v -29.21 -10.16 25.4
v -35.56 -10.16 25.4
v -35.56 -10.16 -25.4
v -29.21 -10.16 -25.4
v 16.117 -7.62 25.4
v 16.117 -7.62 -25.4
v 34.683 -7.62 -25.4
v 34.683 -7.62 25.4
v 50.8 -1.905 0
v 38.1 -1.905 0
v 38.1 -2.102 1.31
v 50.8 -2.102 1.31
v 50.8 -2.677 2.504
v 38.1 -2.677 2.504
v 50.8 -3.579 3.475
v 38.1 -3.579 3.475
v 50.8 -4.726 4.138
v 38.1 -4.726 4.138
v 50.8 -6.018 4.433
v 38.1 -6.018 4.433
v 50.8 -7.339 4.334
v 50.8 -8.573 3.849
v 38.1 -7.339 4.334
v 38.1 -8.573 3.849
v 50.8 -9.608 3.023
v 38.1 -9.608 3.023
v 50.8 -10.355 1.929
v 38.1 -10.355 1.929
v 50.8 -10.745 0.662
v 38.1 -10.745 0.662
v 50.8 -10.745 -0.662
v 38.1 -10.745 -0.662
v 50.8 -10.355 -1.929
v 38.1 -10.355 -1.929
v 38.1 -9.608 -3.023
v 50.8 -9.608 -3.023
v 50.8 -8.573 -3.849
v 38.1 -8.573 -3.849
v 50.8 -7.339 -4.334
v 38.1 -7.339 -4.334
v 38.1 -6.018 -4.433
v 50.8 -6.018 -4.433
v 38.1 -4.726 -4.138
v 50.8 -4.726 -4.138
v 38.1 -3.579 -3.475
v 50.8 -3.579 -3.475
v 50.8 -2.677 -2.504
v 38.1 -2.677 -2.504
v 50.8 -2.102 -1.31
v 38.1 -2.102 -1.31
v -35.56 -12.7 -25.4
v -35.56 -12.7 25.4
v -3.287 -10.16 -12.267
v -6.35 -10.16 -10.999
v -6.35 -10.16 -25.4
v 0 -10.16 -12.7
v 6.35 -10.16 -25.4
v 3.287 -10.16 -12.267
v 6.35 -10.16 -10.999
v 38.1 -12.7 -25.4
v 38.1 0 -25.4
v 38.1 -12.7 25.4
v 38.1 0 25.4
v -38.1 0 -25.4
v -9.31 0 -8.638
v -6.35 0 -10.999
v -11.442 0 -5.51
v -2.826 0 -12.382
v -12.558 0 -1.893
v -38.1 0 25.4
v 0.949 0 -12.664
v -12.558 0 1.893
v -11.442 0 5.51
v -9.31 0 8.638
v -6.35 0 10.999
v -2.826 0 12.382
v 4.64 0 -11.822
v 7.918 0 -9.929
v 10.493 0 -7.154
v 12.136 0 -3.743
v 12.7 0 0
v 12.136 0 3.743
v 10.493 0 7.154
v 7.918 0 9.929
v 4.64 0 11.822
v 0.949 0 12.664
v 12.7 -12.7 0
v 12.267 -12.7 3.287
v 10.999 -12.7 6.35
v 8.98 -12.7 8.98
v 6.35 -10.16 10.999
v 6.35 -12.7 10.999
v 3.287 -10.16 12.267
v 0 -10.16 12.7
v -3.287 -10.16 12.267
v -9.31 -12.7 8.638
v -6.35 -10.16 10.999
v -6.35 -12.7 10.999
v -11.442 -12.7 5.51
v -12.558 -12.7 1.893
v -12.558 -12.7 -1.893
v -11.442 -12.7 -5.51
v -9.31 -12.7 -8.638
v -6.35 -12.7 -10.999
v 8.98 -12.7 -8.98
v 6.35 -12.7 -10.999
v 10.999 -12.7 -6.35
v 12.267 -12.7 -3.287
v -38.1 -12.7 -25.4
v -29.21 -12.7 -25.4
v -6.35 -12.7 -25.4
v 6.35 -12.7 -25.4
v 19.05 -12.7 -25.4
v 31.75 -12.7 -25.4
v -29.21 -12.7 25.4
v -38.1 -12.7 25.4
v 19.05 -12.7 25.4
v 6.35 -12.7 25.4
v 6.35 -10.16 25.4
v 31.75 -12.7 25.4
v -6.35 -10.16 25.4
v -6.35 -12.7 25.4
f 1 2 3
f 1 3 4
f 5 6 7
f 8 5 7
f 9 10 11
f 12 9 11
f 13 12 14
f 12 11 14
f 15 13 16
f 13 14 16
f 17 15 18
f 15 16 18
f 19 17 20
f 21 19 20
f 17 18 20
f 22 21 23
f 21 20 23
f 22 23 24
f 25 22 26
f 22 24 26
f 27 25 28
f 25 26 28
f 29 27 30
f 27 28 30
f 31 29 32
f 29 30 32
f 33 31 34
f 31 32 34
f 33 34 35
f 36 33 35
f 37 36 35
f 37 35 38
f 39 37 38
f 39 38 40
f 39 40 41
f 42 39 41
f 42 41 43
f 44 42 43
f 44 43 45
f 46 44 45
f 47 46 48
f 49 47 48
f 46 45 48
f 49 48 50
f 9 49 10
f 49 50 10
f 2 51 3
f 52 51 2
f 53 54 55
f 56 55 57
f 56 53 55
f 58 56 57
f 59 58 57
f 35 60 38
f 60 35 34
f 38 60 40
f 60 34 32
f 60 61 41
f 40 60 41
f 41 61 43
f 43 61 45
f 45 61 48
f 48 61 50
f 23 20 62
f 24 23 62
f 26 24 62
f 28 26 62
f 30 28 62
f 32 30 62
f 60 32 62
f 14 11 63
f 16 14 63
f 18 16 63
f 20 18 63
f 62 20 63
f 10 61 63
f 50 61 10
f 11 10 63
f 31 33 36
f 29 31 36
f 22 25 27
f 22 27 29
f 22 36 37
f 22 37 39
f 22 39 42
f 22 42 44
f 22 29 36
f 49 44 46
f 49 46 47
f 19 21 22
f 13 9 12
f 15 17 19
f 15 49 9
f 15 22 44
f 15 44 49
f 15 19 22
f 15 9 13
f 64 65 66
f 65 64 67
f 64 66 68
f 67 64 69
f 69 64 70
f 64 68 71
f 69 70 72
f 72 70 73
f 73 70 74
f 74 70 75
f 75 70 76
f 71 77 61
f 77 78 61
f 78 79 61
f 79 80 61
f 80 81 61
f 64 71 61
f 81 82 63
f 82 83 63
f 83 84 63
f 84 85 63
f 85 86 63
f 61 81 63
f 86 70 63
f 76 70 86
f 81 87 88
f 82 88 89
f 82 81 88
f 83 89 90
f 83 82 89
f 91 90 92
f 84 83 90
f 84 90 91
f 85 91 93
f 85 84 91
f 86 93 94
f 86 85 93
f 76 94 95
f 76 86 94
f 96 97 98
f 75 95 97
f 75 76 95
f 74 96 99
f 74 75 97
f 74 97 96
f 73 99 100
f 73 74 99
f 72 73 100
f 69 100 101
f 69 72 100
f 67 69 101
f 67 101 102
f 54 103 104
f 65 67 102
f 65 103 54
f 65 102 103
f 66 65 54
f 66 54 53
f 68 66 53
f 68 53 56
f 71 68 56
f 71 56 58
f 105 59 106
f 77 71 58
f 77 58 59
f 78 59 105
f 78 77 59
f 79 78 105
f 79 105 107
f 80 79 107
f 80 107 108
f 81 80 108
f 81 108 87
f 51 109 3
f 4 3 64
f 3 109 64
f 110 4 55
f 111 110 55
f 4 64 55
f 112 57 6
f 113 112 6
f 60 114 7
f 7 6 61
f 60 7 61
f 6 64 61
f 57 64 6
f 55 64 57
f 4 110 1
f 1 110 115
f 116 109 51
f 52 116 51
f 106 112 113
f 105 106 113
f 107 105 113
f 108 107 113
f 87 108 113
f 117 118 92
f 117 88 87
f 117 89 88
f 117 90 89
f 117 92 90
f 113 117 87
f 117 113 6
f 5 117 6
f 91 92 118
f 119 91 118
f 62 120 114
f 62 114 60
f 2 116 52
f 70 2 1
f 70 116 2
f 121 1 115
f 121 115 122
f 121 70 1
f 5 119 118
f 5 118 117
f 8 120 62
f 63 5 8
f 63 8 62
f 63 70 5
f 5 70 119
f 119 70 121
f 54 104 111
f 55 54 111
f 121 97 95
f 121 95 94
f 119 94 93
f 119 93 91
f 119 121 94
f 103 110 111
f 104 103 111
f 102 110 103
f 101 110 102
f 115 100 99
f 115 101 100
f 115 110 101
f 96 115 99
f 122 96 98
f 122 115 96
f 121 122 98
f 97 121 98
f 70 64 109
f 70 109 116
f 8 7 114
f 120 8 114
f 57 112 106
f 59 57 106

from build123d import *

# Parameters (mm, degrees)
F0_W     = 76.2
F0_H     = 50.8
F0_R     = 12.7
F1_DEPTH = 12.7
F2_W     = 6.35
F2_H     = 50.8
F3_DEPTH = 2.54
F5_DEPTH = 50.801
F6_R     = 4.445
F7_DEPTH = 12.7


with BuildPart() as f1:
    # F0 (on Front) → F1 (new body)
    with BuildSketch(Plane.XZ):
        Rectangle(F0_W, F0_H)
        Circle(F0_R, mode=Mode.SUBTRACT)
    extrude(amount=F1_DEPTH)

    # F2 (on face) → F3 (cut)
    with BuildSketch(Plane.XZ.offset(12.7)):
        with Locations((-32.385, 0)):
            Rectangle(F2_W, F2_H)
        with BuildLine():
            Line((6.35, 25.4), (-6.35, 25.4))
            Line((-6.35, 25.4), (-6.35, 10.9985226281))
            ThreePointArc((-6.35, 10.9985226281), (0, 12.7), (6.35, 10.9985226281))
            Line((6.35, 10.9985226281), (6.35, 25.4))
        make_face()
        with BuildLine():
            Line((-6.35, -10.9985226281), (-6.35, -25.4))
            Line((-6.35, -25.4), (6.35, -25.4))
            Line((6.35, -25.4), (6.35, -10.9985226281))
            ThreePointArc((6.35, -10.9985226281), (0, -12.7), (-6.35, -10.9985226281))
        make_face()
    extrude(amount=-F3_DEPTH, mode=Mode.SUBTRACT)

    # F4 (on face) → F5 (cut, through all)
    with BuildSketch(Plane(origin=(0, 0, -25.4), x_dir=(1, 0, 0), z_dir=(0, 0, -1))):
        Polygon((31.75, 12.7), (19.05, 12.7), (16.1170606325, 7.62), (34.6829393675, 7.62), align=None)
    extrude(amount=-F5_DEPTH, mode=Mode.SUBTRACT)

    # F6 (on face) → F7 (join)
    with BuildSketch(Plane.YZ.offset(38.1)):
        with Locations((-6.35, 0)):
            Circle(F6_R)
    extrude(amount=F7_DEPTH)


solid = f1.part
